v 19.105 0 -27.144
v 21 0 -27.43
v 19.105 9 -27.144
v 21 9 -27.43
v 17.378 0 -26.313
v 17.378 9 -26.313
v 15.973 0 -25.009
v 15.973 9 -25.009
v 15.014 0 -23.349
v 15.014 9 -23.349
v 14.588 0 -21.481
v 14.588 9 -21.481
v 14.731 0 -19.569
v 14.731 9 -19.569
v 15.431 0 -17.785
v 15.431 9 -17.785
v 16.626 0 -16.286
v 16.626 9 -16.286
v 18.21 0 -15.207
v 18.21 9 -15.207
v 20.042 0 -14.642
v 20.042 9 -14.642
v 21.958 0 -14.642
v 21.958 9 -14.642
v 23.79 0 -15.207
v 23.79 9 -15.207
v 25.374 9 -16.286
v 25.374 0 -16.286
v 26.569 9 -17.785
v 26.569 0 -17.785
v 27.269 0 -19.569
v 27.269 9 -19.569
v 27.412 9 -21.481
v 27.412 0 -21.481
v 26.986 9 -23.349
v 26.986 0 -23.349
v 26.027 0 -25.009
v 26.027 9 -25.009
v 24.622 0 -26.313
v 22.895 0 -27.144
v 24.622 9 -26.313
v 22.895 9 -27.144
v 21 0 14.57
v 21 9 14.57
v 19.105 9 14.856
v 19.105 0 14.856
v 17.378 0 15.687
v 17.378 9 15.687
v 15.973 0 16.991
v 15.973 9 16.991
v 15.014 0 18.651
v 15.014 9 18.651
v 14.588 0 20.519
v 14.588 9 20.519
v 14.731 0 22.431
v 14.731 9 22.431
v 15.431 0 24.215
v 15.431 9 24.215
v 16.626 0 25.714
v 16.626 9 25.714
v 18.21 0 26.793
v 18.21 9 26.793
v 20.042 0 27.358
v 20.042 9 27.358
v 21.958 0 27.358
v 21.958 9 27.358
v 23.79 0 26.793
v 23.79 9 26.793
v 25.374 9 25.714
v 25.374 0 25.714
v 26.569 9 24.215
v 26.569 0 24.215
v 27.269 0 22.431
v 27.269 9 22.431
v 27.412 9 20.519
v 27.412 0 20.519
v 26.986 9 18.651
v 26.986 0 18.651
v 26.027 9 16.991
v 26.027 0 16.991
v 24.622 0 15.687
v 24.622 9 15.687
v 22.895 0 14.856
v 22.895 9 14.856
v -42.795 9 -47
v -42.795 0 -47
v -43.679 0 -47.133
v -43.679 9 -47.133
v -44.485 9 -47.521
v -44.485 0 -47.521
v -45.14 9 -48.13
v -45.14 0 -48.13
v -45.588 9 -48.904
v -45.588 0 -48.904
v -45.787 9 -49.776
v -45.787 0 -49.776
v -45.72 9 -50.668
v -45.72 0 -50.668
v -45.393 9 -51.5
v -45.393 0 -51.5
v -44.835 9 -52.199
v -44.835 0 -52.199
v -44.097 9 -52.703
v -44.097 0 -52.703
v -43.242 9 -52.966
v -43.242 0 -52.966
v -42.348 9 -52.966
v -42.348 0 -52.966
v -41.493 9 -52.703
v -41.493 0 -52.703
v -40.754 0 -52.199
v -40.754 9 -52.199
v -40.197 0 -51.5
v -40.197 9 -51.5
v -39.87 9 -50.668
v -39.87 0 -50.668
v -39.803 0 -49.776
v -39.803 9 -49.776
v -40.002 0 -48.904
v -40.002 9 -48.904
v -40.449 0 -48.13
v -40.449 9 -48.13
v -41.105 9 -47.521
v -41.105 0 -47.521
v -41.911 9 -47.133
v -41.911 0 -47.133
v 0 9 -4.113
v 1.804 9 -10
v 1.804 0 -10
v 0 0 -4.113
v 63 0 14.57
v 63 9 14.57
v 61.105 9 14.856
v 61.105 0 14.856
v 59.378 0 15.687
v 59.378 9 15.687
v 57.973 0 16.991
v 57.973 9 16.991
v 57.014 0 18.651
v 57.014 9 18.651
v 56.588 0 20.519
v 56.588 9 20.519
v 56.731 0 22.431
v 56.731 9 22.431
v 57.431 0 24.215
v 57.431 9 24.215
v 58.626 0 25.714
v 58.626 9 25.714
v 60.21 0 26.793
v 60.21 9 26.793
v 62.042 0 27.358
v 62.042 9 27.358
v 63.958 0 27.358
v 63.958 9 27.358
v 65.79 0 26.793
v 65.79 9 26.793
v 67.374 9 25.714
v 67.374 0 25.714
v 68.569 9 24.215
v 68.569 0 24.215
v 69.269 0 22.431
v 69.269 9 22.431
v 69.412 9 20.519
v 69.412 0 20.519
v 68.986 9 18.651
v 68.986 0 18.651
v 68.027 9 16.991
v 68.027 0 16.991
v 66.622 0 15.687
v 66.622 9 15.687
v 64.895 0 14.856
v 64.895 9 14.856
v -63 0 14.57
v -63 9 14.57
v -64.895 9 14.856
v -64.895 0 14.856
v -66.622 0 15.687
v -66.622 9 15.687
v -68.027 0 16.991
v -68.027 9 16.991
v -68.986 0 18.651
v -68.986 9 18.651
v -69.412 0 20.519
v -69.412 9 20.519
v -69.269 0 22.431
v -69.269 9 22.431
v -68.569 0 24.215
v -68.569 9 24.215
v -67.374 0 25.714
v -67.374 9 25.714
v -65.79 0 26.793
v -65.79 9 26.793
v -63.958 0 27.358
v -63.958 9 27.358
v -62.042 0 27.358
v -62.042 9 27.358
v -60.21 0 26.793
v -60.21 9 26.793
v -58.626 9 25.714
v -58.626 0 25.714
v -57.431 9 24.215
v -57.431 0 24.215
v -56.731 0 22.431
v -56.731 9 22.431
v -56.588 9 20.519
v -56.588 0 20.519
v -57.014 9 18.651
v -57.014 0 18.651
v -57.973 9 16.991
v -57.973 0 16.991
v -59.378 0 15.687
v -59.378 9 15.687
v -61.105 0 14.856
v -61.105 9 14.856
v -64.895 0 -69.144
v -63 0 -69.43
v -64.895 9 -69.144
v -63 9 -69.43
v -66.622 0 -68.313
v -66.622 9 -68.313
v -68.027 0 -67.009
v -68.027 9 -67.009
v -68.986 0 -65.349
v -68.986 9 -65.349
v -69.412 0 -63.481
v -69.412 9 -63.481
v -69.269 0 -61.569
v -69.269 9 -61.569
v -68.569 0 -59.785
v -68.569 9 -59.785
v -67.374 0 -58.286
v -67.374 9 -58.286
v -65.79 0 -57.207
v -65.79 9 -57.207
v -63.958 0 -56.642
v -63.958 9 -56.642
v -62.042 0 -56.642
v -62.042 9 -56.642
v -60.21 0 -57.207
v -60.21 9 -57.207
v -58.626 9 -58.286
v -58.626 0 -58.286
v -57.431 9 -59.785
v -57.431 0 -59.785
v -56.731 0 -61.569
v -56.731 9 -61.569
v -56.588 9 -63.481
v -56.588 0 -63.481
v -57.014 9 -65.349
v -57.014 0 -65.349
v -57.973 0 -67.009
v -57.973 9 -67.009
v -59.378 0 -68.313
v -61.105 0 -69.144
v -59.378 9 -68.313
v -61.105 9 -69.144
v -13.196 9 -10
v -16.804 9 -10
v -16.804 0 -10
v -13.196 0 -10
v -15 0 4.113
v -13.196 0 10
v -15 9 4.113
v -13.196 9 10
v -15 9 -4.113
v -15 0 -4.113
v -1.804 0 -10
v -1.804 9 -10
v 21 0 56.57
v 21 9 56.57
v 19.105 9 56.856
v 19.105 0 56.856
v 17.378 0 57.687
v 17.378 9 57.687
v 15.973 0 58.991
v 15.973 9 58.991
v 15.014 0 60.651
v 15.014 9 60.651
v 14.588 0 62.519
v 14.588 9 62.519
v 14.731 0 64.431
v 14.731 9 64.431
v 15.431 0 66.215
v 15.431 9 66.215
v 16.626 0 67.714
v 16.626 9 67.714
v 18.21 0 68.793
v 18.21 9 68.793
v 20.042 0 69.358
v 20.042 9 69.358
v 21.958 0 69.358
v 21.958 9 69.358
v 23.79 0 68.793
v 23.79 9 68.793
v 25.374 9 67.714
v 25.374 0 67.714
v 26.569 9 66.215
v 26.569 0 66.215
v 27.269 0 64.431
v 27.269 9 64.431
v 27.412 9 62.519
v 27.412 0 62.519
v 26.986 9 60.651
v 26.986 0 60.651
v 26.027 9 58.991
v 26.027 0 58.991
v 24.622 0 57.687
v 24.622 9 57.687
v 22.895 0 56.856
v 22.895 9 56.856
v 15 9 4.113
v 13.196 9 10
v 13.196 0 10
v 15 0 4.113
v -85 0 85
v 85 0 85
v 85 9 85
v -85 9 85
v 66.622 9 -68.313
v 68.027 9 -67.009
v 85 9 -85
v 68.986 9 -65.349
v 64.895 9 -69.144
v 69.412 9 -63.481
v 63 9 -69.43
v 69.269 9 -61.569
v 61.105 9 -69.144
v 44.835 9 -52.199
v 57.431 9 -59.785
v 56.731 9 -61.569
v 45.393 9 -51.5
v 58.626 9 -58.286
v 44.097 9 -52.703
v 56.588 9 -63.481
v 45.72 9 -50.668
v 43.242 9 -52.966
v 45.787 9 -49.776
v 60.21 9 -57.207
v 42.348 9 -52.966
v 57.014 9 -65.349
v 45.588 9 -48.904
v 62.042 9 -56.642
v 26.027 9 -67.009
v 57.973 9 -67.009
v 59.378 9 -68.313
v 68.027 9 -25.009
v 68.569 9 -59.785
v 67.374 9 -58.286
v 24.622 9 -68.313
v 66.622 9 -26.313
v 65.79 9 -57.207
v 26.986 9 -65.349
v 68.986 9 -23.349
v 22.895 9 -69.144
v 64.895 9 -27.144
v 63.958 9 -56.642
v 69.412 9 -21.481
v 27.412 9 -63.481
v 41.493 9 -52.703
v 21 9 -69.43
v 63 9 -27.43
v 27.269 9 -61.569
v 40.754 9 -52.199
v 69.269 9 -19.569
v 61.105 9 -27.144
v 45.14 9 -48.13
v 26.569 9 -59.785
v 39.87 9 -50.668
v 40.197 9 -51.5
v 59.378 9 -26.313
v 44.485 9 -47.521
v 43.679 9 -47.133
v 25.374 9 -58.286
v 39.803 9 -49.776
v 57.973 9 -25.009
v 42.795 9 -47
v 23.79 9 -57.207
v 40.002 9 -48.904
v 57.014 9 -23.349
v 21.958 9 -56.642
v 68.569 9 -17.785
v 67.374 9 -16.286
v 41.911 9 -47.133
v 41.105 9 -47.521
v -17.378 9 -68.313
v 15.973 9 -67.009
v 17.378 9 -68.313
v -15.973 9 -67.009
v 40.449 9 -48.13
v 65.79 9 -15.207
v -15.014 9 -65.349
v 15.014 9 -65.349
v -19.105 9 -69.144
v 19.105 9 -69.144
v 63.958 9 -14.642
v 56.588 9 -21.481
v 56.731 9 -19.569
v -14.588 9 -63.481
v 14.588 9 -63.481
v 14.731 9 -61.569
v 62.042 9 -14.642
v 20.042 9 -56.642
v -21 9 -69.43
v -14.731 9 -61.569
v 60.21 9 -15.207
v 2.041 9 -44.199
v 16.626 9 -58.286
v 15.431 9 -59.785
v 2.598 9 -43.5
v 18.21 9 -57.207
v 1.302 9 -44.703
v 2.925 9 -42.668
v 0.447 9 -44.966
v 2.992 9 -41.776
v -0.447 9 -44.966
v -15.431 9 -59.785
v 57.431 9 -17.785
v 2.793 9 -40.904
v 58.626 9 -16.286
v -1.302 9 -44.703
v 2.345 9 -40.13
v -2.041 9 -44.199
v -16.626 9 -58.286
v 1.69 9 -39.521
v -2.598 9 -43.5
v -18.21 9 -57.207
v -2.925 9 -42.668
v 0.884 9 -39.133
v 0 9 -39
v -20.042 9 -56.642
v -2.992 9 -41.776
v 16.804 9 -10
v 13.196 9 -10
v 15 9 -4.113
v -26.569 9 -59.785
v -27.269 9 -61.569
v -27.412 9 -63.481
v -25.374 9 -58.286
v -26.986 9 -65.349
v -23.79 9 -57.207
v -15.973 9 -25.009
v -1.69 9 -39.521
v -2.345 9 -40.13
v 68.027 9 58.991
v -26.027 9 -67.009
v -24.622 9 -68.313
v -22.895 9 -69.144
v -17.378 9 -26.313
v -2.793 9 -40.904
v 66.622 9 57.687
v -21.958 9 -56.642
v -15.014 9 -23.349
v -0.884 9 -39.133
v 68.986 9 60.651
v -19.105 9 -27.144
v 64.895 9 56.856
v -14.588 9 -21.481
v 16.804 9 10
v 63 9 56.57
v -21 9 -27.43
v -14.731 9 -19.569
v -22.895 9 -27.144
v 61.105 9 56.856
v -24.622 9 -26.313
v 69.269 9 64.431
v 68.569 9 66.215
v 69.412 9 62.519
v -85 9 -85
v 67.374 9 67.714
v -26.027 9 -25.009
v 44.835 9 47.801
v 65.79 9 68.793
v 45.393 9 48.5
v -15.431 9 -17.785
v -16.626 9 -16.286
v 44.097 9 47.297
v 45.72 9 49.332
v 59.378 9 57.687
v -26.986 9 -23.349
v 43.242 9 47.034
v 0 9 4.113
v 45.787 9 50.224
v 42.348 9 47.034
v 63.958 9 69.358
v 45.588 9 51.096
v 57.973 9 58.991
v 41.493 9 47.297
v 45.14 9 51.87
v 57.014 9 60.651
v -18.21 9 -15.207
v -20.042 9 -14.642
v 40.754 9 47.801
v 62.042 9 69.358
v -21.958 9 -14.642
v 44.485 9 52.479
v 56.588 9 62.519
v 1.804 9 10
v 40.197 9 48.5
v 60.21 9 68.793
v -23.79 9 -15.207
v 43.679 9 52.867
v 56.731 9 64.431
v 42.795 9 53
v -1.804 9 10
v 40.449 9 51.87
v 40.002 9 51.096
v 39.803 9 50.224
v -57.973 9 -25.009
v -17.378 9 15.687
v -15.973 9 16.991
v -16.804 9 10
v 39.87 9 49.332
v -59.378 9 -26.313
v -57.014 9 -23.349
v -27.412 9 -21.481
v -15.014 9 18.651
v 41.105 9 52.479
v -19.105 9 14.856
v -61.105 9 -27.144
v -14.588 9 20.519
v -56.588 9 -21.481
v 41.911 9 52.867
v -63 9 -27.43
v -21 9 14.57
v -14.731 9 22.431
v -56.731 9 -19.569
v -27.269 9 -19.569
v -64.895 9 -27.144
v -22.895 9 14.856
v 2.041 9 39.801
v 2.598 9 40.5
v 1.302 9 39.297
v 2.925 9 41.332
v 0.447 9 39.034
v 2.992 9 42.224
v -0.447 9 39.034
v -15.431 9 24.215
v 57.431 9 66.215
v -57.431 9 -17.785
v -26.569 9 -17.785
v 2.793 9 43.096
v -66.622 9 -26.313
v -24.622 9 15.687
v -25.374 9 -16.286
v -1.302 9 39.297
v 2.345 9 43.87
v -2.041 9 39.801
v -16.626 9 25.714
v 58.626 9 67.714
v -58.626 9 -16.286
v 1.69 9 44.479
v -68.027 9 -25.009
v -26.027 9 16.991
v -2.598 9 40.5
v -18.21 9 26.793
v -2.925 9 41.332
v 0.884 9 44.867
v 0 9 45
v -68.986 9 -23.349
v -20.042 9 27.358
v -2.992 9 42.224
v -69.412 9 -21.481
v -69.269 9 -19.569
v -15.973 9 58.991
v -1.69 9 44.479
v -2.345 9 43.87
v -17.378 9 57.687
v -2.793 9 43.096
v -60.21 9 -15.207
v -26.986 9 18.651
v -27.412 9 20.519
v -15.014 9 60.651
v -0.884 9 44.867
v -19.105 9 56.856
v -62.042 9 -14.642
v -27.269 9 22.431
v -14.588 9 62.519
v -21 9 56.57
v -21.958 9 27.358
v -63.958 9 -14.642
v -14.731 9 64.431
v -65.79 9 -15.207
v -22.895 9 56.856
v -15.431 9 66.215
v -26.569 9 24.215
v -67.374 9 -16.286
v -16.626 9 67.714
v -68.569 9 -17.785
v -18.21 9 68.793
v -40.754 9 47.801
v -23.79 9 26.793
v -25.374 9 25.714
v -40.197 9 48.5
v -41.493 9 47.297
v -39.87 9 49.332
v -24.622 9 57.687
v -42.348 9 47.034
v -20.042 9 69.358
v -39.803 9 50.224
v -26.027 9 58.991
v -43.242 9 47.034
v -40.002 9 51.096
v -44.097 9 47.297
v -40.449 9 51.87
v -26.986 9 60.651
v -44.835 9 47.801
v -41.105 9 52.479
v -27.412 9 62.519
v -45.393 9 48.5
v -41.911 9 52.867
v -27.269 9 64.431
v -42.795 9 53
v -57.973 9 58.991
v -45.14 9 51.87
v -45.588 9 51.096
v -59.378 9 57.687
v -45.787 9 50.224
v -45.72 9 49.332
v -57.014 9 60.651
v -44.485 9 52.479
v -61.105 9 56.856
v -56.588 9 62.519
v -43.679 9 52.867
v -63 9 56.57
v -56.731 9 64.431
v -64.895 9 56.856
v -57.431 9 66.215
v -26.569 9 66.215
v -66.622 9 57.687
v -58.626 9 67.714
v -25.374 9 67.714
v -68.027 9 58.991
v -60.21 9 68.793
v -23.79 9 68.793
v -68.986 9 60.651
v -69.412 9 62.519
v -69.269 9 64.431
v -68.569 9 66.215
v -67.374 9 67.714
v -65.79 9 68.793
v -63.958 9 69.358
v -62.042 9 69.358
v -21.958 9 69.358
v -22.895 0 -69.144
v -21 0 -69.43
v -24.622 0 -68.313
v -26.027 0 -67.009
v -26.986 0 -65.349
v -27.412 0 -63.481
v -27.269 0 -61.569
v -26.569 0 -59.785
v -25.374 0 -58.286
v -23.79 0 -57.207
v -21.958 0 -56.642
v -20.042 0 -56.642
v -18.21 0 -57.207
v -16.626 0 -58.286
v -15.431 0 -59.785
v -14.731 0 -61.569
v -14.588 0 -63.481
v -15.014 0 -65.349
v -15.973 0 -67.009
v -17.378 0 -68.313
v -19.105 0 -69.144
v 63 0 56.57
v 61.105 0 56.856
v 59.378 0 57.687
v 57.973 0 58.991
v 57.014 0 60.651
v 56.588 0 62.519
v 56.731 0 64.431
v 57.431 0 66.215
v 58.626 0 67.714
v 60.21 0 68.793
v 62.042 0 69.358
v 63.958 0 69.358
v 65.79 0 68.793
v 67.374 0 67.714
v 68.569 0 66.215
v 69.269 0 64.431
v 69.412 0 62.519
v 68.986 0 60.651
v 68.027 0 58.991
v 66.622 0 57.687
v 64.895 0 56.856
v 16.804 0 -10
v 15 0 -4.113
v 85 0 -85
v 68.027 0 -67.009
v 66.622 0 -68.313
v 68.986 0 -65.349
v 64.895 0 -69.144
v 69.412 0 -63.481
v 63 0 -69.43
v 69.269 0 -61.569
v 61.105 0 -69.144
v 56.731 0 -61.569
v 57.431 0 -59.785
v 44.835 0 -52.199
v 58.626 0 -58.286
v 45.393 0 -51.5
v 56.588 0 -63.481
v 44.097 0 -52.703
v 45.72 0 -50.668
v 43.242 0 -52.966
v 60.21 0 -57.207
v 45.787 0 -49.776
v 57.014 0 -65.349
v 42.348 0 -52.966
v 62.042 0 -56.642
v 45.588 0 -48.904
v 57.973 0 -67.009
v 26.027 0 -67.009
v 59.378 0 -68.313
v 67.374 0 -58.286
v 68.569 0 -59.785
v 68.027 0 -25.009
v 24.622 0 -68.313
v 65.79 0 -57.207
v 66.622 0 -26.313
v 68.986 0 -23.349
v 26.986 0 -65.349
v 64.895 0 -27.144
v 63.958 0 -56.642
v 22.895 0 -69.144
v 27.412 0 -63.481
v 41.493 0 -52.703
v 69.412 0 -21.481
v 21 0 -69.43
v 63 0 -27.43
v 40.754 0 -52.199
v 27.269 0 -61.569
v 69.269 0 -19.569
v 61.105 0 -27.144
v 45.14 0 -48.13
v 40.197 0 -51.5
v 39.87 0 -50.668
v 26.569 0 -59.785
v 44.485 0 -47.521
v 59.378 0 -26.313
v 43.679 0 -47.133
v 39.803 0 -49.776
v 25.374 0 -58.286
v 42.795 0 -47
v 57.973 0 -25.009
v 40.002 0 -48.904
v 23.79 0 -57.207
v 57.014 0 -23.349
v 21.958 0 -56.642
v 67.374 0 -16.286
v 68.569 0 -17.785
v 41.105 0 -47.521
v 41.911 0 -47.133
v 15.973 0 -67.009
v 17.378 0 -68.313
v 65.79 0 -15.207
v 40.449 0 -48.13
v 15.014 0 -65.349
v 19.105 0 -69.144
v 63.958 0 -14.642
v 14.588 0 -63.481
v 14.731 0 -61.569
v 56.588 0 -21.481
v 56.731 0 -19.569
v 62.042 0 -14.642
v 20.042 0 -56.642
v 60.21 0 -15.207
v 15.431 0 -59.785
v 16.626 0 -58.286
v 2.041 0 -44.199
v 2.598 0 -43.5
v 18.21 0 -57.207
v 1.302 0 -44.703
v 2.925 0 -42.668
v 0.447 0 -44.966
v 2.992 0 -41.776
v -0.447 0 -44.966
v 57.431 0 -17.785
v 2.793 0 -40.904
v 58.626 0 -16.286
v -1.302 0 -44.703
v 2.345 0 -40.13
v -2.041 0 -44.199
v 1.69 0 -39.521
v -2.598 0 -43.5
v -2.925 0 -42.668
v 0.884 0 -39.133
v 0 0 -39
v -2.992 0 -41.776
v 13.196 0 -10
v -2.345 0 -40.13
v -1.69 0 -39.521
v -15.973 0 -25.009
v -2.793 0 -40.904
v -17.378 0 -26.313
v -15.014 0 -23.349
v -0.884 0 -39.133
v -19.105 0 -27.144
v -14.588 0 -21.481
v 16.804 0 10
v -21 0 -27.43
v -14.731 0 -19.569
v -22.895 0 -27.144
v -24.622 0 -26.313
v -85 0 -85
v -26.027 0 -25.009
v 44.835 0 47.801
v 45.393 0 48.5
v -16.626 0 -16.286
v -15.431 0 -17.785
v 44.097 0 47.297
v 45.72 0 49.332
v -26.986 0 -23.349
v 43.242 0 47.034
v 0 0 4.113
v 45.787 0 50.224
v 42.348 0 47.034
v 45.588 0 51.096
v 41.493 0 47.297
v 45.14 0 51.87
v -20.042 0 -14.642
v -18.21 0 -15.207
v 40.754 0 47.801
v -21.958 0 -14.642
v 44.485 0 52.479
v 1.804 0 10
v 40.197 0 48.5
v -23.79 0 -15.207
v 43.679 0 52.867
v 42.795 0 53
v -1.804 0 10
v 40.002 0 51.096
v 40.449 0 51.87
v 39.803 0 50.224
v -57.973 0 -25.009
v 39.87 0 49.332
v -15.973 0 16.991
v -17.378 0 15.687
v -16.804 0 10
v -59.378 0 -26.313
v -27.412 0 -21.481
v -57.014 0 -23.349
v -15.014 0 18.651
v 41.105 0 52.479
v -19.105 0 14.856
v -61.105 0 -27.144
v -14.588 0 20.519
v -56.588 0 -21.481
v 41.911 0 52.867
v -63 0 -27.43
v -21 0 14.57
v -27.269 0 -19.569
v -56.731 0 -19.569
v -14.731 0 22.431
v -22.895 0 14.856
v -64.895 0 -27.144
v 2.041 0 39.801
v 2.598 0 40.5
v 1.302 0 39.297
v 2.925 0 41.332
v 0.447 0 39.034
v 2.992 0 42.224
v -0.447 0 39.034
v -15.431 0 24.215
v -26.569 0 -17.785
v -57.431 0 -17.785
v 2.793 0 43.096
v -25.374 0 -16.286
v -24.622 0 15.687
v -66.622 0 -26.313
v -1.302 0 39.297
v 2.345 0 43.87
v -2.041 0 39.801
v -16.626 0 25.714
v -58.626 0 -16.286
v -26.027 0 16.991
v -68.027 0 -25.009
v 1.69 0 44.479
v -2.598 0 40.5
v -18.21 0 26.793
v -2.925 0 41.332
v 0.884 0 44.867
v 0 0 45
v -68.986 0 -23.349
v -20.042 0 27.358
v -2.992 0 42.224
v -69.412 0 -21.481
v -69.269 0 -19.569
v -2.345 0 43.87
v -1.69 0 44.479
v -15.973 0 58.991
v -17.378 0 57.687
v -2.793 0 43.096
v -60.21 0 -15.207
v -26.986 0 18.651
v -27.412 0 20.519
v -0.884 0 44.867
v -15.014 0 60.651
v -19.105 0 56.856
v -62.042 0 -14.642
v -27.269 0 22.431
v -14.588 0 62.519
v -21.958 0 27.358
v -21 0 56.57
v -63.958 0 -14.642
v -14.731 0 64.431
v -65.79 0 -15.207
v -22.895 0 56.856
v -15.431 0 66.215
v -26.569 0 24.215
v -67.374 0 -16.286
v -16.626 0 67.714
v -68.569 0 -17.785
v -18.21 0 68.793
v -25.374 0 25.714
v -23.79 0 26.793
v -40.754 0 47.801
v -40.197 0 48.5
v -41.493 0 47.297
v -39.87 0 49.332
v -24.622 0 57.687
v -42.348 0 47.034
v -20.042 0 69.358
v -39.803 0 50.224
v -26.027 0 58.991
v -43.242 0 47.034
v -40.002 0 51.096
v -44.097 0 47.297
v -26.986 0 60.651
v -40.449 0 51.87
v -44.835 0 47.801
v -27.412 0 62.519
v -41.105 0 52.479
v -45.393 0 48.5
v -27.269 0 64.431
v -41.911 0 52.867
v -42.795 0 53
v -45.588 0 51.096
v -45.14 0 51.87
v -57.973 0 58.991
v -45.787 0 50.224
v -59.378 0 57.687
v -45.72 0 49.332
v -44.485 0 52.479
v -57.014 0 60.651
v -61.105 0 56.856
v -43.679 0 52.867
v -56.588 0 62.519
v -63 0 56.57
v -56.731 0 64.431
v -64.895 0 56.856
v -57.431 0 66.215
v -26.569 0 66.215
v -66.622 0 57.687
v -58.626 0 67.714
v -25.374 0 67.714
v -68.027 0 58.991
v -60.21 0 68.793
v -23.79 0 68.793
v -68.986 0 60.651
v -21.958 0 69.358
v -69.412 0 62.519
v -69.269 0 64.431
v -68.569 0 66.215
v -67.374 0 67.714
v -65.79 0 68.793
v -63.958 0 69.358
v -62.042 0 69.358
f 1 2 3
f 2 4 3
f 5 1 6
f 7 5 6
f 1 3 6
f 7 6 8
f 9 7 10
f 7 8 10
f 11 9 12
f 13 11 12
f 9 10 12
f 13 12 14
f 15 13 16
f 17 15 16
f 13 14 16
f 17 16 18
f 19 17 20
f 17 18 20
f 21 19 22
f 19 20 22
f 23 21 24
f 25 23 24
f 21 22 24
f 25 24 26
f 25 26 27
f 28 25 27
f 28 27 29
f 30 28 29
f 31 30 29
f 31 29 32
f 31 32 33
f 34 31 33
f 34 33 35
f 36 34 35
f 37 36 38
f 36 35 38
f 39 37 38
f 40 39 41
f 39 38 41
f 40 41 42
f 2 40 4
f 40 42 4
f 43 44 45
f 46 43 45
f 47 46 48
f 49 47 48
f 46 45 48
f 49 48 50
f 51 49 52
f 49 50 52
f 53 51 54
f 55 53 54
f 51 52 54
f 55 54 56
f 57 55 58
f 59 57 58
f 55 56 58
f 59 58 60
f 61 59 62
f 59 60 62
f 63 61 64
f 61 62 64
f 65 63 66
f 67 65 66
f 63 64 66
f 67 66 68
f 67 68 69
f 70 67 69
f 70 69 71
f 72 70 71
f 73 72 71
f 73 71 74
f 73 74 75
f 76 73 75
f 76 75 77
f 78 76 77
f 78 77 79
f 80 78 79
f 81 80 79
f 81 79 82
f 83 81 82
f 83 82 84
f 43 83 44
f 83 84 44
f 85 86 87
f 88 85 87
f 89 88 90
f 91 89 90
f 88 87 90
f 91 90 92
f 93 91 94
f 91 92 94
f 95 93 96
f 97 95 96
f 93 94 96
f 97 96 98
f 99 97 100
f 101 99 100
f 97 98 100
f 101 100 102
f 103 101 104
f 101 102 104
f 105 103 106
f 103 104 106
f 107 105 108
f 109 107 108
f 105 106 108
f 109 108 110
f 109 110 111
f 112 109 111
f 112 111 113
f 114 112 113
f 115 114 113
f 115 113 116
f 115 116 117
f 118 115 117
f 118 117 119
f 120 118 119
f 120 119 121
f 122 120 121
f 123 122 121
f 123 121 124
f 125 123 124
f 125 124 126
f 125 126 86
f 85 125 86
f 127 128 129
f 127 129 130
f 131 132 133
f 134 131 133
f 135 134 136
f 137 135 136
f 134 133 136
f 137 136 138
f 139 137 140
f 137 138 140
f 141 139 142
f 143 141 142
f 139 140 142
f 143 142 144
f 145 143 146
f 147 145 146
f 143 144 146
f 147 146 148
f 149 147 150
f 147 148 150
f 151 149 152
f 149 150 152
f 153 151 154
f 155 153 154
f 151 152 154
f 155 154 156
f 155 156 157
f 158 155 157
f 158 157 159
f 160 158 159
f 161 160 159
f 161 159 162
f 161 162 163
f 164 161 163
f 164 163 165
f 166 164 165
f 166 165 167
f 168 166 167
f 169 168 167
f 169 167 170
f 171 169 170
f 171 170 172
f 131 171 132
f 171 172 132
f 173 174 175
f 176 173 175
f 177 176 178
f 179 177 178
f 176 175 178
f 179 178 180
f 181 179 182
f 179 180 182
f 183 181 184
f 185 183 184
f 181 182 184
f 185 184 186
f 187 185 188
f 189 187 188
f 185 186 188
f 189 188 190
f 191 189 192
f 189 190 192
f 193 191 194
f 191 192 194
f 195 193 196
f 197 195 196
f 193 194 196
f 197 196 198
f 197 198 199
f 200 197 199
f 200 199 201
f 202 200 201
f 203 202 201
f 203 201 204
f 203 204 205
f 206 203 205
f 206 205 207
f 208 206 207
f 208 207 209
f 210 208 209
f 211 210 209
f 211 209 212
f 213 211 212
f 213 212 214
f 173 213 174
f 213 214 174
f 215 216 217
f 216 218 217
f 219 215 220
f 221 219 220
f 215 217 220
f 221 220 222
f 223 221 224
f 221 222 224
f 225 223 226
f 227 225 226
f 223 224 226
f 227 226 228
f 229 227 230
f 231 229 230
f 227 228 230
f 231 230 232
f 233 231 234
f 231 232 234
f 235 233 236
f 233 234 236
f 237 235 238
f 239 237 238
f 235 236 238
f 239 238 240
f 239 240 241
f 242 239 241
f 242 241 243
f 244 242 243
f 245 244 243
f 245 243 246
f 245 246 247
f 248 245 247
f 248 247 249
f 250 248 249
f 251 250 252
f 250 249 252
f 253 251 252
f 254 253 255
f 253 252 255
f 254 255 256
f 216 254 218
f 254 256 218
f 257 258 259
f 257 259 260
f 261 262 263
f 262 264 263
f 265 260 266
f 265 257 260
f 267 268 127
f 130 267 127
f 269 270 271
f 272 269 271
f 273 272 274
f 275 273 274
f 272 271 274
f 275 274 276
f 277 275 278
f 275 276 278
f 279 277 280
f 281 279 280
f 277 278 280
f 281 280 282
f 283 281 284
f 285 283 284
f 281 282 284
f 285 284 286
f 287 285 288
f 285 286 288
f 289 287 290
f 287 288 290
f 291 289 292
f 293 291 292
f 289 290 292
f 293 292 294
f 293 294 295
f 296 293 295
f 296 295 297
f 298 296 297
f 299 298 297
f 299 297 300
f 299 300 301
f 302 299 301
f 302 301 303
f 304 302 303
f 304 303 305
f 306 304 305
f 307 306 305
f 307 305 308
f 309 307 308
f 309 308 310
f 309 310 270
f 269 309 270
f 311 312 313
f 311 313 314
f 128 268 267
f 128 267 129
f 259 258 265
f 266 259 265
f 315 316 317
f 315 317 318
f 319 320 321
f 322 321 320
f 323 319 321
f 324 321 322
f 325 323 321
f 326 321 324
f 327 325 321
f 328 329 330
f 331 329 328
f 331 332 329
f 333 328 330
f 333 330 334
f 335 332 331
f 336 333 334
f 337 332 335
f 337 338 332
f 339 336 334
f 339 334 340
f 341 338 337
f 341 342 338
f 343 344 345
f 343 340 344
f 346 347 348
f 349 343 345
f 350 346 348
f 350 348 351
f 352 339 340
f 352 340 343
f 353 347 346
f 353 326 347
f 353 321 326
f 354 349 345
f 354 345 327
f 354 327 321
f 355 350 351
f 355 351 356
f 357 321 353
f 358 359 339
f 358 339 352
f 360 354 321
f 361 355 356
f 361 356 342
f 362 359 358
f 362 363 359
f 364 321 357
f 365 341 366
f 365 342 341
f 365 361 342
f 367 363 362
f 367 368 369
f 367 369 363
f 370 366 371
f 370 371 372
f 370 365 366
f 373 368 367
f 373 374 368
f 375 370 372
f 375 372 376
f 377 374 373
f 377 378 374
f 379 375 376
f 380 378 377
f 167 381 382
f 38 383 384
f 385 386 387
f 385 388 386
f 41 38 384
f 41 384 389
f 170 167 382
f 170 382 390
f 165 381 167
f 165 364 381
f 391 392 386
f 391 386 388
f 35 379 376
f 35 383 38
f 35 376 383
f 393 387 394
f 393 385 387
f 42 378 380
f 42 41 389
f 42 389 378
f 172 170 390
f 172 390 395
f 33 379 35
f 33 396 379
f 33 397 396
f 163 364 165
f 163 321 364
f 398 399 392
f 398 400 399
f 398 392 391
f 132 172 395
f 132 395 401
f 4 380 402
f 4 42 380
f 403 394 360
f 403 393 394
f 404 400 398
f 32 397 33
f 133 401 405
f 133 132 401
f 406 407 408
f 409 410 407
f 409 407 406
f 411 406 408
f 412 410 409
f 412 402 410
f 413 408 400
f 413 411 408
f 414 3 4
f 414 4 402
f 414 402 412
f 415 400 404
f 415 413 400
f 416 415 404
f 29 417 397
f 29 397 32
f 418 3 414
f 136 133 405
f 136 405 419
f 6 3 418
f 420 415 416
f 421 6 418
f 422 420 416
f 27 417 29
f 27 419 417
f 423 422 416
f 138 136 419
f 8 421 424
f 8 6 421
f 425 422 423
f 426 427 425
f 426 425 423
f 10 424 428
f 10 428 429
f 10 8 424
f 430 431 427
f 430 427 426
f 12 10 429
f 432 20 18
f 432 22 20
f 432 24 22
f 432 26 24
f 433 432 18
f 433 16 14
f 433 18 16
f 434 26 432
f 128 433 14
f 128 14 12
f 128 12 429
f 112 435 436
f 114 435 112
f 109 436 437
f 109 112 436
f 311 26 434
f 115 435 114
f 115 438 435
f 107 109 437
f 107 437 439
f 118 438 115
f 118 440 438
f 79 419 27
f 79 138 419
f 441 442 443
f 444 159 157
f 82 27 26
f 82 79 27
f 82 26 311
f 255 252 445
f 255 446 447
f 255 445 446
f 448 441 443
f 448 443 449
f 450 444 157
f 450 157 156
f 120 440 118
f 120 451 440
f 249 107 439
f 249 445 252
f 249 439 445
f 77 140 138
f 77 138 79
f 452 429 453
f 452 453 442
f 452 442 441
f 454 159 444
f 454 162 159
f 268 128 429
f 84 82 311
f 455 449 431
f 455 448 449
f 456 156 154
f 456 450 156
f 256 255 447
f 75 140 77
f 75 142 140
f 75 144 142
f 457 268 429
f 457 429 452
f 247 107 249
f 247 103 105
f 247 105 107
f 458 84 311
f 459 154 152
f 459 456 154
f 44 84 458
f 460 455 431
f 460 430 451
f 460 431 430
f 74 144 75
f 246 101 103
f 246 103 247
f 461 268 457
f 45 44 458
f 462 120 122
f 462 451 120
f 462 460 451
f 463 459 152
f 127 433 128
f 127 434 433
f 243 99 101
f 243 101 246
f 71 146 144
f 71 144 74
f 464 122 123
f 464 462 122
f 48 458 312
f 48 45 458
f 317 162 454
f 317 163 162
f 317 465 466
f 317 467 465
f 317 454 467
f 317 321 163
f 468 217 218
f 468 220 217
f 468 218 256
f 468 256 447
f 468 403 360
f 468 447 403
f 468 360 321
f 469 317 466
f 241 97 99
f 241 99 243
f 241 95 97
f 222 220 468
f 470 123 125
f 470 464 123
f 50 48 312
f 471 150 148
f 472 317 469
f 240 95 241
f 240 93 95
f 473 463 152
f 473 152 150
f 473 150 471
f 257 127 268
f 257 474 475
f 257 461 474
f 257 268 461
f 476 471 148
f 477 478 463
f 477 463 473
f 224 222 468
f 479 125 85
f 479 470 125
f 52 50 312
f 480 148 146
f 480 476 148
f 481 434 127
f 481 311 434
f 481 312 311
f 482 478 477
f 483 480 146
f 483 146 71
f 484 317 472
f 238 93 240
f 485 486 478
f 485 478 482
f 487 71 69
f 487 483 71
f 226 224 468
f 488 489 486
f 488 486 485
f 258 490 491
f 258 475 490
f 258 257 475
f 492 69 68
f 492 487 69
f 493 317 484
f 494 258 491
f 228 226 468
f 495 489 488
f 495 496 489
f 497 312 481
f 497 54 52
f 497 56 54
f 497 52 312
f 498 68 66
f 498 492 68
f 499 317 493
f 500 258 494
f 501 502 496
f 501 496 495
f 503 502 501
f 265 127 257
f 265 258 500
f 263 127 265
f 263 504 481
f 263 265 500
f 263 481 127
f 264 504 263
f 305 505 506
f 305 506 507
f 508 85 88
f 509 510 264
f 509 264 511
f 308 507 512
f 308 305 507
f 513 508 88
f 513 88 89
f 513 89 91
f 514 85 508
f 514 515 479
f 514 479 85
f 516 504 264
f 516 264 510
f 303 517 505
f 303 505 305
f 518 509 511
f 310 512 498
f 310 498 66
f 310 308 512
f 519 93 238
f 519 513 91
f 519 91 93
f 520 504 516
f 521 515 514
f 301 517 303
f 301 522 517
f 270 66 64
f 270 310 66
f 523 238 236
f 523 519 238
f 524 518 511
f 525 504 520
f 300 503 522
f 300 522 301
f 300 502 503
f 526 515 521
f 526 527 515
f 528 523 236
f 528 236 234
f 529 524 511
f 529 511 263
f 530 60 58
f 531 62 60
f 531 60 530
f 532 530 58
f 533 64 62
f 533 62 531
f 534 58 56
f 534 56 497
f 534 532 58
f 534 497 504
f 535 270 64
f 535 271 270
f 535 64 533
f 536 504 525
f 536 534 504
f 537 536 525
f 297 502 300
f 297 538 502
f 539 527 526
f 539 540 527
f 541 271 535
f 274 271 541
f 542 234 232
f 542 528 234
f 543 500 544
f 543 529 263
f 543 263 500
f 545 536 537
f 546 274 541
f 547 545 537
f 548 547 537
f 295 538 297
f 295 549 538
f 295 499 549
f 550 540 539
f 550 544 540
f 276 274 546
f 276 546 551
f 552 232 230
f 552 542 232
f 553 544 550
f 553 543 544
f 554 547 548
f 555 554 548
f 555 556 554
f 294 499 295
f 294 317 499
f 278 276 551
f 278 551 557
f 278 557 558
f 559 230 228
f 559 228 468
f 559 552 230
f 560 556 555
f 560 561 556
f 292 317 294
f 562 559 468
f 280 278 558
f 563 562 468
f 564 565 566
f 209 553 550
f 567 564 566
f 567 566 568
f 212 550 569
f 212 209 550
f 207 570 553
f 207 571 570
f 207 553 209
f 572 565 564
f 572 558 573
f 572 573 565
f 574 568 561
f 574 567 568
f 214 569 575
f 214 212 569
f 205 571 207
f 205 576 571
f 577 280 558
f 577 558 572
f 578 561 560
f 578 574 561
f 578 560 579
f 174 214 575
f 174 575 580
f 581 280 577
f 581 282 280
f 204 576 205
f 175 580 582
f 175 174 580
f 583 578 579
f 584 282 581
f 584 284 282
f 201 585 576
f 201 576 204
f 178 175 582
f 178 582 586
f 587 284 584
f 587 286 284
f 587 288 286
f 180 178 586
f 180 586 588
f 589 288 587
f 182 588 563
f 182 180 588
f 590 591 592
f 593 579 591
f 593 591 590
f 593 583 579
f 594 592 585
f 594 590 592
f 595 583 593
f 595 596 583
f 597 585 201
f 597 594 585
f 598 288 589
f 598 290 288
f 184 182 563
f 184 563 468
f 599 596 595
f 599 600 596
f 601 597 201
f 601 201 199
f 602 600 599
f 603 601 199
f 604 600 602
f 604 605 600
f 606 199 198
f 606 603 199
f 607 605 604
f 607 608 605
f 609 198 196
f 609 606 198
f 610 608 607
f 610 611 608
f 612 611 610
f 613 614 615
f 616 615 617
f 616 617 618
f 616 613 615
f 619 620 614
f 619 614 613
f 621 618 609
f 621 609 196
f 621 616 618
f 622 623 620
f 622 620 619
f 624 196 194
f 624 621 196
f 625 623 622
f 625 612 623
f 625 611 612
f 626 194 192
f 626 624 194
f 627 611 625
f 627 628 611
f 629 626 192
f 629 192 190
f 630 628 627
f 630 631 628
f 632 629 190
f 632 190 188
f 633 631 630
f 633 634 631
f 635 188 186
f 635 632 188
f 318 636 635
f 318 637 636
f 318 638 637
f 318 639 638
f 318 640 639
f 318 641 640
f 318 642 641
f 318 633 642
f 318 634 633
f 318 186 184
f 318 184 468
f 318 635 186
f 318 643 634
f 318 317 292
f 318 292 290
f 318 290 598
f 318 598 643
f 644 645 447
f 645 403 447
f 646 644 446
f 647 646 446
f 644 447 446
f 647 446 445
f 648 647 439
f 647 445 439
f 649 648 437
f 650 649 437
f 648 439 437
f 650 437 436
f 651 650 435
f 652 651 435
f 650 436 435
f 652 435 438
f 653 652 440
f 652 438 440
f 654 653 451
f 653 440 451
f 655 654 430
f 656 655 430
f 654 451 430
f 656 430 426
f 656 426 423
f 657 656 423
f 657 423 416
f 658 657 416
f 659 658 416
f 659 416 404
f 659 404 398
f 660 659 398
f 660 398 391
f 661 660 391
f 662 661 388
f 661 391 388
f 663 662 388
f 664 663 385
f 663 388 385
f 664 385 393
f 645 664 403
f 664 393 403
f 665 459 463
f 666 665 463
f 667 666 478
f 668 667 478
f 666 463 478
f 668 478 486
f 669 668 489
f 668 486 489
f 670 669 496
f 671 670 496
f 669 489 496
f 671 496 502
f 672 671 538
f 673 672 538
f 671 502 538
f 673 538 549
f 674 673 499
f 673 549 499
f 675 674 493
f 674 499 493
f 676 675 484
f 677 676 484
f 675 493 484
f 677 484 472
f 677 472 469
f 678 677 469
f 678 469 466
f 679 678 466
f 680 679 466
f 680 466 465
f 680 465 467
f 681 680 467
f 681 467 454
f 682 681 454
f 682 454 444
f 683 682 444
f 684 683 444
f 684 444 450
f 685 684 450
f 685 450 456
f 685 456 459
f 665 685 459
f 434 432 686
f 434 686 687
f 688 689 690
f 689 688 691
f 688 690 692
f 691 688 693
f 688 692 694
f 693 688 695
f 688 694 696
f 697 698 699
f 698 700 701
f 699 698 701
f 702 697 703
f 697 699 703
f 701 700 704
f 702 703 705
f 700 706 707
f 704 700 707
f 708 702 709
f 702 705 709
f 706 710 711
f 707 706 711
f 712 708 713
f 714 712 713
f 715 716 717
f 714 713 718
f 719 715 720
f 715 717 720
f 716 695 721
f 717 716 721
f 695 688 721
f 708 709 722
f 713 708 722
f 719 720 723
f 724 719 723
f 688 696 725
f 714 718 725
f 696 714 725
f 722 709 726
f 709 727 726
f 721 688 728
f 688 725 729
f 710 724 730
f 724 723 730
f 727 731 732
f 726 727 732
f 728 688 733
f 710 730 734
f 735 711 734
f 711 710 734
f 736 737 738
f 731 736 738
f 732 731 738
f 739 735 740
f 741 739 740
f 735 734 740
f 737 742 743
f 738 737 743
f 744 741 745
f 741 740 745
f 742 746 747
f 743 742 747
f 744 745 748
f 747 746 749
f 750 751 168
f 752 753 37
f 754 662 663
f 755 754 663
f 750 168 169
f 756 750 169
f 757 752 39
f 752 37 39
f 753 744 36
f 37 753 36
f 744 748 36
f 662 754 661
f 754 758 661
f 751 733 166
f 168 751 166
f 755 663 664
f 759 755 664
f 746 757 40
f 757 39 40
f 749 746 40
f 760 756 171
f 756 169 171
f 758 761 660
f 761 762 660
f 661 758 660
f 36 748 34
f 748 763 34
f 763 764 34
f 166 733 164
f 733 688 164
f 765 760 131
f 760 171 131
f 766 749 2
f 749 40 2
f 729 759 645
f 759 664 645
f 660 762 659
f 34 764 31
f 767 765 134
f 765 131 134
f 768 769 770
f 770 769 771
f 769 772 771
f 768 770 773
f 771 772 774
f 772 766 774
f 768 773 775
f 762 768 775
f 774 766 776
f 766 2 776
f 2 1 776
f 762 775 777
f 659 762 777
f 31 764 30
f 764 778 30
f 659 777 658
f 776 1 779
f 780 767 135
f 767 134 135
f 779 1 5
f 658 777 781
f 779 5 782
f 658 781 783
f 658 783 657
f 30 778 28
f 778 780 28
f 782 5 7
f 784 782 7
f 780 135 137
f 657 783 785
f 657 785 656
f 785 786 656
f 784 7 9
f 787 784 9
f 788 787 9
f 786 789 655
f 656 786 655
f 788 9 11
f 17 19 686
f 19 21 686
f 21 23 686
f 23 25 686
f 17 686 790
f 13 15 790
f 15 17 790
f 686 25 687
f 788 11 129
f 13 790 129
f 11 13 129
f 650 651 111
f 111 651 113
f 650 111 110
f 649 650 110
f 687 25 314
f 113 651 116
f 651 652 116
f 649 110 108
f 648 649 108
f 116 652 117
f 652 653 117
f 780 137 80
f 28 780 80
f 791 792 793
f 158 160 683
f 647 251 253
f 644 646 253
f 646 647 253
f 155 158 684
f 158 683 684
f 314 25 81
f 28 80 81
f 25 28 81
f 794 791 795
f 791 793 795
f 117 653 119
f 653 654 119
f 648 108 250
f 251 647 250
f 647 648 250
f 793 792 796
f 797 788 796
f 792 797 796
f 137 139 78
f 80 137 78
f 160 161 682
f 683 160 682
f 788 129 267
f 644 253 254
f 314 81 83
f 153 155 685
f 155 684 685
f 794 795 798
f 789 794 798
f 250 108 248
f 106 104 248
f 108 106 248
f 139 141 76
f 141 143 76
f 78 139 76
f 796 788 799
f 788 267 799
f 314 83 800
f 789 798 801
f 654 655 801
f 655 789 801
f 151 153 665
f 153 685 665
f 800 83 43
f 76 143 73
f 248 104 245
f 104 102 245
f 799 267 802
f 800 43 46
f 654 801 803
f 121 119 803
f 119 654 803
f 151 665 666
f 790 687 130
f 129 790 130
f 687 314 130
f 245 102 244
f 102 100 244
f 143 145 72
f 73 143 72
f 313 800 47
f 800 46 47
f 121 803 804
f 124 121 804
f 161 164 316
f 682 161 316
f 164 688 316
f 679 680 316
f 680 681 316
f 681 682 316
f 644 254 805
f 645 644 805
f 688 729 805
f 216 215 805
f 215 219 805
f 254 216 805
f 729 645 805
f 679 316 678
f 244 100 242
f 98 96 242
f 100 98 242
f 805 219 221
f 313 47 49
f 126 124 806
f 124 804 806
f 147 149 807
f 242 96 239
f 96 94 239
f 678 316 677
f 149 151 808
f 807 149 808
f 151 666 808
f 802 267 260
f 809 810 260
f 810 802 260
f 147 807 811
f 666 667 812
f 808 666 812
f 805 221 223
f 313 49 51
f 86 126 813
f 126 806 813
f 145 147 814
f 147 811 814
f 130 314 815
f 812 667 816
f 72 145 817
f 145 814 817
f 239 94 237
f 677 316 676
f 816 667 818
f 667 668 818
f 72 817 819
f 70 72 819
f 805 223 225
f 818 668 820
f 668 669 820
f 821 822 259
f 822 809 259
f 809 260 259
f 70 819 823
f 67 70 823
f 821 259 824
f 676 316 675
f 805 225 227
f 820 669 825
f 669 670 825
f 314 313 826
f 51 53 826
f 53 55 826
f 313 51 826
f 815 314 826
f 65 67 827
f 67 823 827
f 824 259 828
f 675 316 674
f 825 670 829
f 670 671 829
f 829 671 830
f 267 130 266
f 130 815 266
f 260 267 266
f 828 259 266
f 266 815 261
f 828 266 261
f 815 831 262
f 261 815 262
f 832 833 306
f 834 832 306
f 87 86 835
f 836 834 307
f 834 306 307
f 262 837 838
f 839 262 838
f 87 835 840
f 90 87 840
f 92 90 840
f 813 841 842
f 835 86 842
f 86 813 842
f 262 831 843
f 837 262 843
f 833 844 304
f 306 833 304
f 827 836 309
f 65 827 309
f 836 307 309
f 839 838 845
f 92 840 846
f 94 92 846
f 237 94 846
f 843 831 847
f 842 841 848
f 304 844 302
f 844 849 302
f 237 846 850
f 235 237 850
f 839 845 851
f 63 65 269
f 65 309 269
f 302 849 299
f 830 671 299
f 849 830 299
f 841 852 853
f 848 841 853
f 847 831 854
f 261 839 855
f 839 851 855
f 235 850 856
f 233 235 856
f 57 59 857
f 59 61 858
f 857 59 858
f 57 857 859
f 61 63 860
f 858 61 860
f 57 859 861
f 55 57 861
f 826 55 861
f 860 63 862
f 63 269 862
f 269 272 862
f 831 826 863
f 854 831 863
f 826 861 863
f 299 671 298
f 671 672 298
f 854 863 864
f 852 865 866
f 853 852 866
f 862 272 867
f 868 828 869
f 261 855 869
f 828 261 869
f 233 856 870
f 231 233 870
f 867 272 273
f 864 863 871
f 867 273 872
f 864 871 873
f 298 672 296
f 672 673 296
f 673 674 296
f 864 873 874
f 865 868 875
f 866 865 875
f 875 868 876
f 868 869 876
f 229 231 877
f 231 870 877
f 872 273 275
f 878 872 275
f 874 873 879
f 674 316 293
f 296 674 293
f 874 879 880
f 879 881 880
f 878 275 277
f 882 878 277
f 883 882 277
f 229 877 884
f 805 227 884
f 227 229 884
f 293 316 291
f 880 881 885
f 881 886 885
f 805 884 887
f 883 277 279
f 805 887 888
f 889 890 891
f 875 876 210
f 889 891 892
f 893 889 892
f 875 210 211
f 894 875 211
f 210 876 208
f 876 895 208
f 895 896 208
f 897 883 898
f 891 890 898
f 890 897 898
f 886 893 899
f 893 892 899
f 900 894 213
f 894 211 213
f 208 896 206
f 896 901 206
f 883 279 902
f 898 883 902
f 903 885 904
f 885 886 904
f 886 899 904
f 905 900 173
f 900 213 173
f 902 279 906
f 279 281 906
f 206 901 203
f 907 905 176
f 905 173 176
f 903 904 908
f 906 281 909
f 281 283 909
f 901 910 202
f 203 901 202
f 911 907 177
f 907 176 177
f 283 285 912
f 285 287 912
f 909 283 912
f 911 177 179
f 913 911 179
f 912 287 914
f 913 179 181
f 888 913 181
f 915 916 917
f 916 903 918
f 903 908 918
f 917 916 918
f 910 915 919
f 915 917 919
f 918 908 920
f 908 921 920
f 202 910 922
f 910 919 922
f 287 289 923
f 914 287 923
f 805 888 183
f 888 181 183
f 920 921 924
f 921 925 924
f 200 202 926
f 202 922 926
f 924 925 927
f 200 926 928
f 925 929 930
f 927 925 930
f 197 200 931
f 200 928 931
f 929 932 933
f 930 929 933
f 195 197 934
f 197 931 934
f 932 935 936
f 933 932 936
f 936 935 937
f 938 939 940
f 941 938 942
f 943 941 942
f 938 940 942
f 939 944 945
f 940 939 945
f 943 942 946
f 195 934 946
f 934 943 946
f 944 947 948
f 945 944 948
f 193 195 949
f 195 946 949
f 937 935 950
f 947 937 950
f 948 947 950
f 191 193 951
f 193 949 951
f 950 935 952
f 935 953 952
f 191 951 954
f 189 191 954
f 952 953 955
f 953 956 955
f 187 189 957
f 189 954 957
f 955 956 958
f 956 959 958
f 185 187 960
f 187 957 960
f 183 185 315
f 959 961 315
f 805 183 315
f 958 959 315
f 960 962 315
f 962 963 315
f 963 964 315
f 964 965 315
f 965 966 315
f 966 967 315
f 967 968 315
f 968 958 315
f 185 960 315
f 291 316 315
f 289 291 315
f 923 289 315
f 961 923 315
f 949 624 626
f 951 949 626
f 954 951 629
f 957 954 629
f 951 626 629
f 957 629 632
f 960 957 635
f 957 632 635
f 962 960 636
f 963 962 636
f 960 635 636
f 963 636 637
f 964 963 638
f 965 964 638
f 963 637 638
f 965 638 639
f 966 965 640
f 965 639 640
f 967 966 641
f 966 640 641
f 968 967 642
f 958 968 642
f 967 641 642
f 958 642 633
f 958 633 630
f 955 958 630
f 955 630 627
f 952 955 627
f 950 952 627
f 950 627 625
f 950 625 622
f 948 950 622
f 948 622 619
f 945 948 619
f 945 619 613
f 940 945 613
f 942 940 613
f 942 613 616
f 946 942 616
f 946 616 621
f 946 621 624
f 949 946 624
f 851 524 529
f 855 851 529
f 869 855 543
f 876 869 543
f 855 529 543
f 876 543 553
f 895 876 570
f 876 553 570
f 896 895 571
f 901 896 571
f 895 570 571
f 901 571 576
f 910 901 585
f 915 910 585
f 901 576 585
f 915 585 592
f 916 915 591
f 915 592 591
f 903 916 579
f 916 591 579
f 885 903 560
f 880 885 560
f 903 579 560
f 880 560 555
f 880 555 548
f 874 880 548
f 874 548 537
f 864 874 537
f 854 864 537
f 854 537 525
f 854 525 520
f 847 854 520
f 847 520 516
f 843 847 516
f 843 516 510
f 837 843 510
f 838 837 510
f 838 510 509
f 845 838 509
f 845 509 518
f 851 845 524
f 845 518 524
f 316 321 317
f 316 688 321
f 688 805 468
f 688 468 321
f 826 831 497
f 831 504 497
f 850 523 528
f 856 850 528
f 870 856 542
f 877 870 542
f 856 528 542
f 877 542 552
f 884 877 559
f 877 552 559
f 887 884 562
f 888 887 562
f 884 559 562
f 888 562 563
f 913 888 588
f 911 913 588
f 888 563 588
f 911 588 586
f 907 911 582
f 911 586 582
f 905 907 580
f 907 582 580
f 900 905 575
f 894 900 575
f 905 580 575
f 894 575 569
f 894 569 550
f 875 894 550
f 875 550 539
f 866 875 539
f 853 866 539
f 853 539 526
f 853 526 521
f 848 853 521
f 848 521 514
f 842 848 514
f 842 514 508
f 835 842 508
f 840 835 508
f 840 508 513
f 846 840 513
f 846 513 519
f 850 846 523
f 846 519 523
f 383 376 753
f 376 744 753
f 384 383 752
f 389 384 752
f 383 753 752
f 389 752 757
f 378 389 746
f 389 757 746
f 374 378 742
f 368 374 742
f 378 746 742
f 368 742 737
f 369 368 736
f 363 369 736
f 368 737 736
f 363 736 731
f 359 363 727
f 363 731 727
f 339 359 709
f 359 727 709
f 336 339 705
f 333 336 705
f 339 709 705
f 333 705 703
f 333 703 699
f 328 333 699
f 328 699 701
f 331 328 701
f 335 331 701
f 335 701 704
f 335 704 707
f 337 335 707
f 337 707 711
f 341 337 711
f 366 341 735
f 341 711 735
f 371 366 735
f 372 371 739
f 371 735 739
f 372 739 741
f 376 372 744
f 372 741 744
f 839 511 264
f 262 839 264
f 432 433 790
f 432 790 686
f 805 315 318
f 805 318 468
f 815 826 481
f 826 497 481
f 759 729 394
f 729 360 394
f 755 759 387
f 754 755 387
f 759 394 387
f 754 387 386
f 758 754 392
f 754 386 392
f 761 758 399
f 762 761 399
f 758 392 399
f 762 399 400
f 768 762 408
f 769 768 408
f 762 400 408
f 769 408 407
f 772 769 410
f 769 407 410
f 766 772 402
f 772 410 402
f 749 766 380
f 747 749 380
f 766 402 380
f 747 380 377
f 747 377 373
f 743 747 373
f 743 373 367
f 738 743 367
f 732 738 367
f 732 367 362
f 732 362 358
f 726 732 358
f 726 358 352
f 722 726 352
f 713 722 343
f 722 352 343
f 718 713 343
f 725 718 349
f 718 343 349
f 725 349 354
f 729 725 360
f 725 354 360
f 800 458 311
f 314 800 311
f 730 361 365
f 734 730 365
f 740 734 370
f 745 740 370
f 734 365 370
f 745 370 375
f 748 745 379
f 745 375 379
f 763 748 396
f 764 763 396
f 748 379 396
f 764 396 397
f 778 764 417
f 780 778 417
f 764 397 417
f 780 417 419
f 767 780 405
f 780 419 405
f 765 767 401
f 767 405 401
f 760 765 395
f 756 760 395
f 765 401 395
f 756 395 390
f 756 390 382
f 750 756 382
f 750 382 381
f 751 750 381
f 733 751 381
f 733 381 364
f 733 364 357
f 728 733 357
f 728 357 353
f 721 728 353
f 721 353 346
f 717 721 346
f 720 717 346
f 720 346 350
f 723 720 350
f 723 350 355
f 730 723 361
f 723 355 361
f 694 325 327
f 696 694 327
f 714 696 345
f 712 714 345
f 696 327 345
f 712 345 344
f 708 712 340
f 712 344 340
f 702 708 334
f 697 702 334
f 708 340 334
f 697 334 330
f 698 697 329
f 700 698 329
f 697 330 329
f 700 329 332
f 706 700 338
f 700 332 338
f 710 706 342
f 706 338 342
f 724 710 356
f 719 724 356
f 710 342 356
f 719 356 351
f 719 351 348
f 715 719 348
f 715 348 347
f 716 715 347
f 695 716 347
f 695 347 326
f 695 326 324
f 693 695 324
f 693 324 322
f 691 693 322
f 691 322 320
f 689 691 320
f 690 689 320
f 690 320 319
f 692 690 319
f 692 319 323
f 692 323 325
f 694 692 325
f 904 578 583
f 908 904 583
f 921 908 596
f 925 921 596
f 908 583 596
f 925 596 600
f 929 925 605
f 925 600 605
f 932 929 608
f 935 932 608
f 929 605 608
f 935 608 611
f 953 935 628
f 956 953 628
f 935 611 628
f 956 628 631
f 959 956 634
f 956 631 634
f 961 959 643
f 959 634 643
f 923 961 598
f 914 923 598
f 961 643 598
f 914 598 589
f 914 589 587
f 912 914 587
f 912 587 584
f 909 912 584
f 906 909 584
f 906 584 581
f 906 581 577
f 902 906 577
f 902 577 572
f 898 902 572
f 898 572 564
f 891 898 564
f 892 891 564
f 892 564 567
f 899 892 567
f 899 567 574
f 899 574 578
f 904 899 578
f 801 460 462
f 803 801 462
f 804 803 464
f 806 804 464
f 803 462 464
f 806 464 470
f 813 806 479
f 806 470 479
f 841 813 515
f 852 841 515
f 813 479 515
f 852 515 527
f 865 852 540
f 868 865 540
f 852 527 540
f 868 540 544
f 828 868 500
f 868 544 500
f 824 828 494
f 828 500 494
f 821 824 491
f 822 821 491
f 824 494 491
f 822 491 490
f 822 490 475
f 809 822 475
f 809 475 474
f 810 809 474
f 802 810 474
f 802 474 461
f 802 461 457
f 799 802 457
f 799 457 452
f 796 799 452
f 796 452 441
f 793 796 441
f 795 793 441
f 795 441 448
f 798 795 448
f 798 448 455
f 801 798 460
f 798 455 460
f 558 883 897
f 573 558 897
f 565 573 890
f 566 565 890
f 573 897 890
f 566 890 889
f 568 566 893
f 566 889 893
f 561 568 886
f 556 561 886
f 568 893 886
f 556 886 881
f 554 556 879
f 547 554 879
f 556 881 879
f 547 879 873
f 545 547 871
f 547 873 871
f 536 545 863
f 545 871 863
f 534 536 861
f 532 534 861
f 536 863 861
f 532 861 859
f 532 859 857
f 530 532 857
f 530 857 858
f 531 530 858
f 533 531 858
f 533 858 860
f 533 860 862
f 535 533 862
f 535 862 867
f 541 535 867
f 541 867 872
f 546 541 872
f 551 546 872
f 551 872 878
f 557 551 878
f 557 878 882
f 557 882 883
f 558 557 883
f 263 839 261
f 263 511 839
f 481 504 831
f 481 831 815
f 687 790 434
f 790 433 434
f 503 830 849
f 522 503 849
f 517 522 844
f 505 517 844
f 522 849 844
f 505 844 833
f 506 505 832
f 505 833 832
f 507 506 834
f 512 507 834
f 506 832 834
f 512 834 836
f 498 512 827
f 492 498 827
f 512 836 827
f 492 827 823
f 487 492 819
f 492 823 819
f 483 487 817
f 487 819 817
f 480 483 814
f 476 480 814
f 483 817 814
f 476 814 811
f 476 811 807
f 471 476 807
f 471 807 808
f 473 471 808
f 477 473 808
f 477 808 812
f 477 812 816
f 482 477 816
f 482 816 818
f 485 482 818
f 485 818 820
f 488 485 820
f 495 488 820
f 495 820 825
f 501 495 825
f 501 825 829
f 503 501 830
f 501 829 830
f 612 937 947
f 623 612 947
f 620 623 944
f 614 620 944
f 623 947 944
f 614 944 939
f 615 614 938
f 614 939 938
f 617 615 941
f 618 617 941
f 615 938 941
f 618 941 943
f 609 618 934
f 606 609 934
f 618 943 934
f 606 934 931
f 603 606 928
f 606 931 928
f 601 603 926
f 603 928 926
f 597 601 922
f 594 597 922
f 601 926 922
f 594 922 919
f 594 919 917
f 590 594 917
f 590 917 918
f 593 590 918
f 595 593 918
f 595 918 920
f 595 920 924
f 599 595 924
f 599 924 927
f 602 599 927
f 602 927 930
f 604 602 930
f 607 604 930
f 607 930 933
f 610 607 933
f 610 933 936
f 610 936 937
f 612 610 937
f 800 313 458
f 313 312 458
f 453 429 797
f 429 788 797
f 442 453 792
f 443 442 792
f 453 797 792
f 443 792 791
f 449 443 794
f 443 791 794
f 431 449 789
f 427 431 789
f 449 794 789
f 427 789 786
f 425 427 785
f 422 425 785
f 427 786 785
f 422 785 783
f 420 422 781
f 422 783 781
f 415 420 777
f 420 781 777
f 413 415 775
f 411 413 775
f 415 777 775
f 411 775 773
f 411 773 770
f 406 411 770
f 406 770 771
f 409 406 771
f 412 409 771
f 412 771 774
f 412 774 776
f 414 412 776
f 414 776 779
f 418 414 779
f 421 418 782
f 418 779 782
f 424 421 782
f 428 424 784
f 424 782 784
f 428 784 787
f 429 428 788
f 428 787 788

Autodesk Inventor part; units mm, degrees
ref_plane "YZ Plane" through (0, 0, 0) normal (1, 0, 0) x (0, 1, 0)
ref_plane "XZ Plane" through (0, 0, 0) normal (0, 1, 0) x (-1, 0, 0)
ref_plane "XY Plane" through (0, 0, 0) normal (0, 0, 1) x (1, 0, 0)
sketch "Sketch1" plane through (0, 0, 0) normal (0, 1, 0) x (-1, 0, 0)
  line L0 (-85, 85) -> (85, 85)
  line L1 (85, 85) -> (85, -85)
  line L2 (85, -85) -> (-85, -85)
  line L3 (-85, -85) -> (-85, 85)
  line L4 (-85, 85) -> (85, -85) construction
  line L5 (85, 85) -> (-85, -85) construction
  point P0 (0, 0)
  point P1 (-63, -63)
  point P2 (-63, -21)
  point P3 (-63, 21)
  point P4 (-63, 63)
  point P5 (-21, -63)
  point P6 (-21, -21)
  point P7 (-21, 21)
  point P8 (-21, 63)
  point P9 (21, -63)
  point P10 (21, -21)
  point P11 (21, 21)
  point P12 (21, 63)
  point P13 (63, -63)
  point P14 (63, -21)
  point P15 (63, 21)
  point P16 (63, 63)
  dimension "d0" = 170
  dimension "d1" = 170
  dimension "d4" = 42
  dimension "d7" = 42
extrude "Extrusion1" add sketch "Sketch1" along normal blind 9
hole "Hole1" at (63, 0, -63) at (63, 0, -21) at (63, 0, 21) at (63, 0, 63) at (21, 0, -63) at (21, 0, -21) at (21, 0, 21) at (21, 0, 63) at (-21, 0, -63) at (-21, 0, -21) at (-21, 0, 21) at (-21, 0, 63) at (-63, 0, -63) at (-63, 0, -21) at (-63, 0, 21) at (-63, 0, 63) direction (0, 1, 0) diameter 12.86 end through all both
sketch "Sketch2" plane through (0, 9, 0) normal (0, 1, 0) x (1, 0, 0)
  line L0 (-33.7, -4.15) -> (33.7, -4.15)
  line L1 (33.7, -4.15) -> (33.7, 4.15)
  line L2 (33.7, 4.15) -> (-33.7, 4.15)
  line L3 (-33.7, 4.15) -> (-33.7, -4.15)
  line L4 (-33.7, -4.15) -> (33.7, 4.15) construction
  line L5 (33.7, -4.15) -> (-33.7, 4.15) construction
  point P0 (0, 0)
  dimension "d19" = 67.4
  dimension "d20" = 8.3
sketch "Sketch3" plane through (0, 9, 0) normal (0, 1, 0) x (1, 0, 0)
  line L0 (-42.7949, -50) -> (42.7949, -50) construction
  line L1 (42.7949, -50) -> (42.7949, 50) construction
  line L2 (42.7949, 50) -> (-42.7949, 50) construction
  line L3 (-42.7949, 50) -> (-42.7949, -50) construction
  line L4 (-42.7949, -50) -> (42.7949, 50) construction
  line L5 (42.7949, -50) -> (-42.7949, 50) construction
  point P0 (25, -42.5)
  point P1 (0, 0)
  dimension "d31" = 100
hole "Hole3" at (-42.7949, 9, -50) at (42.7949, 9, -50) at (42.7949, 9, 50) at (-42.7949, 9, 50) direction (0, -1, 0) diameter 6 end through all both
sketch "Sketch4" plane through (0, 9, 0) normal (0, 1, 0) x (1, 0, 0)
  circle A0 centre (42.7949, -50) radius 3 construction
  circle A1 centre (-42.7949, 50) radius 3 construction
  circle A2 centre (42.7949, 50) radius 3 construction
  circle A3 centre (-42.7949, -50) radius 3 construction
  circle A4 centre (-63, -21) radius 6.43 construction
  circle A5 centre (-63, 63) radius 6.43 construction
  circle A6 centre (-21, -21) radius 6.43 construction
  circle A7 centre (-21, 63) radius 6.43 construction
  circle A8 centre (21, -21) radius 6.43 construction
  circle A9 centre (21, 63) radius 6.43 construction
  circle A10 centre (63, -21) radius 6.43 construction
  circle A11 centre (63, 63) radius 6.43 construction
  circle A12 centre (63, 21) radius 6.43 construction
  circle A13 centre (63, -63) radius 6.43 construction
  circle A14 centre (21, 21) radius 6.43 construction
  circle A15 centre (21, -63) radius 6.43 construction
  circle A16 centre (-21, 21) radius 6.43 construction
  circle A17 centre (-21, -63) radius 6.43 construction
  circle A18 centre (-63, 21) radius 6.43 construction
  circle A19 centre (-63, -63) radius 6.43 construction
  line L0 (-85, -85) -> (85, -85) construction
  line L1 (85, -85) -> (85, 85) construction
  line L2 (85, 85) -> (-85, 85) construction
  line L3 (-85, 85) -> (-85, -85) construction
  line L4 (-85, 85) -> (85, 85) construction
  line L5 (-7.5, -85) -> (7.5, -85) construction
  line L6 (7.5, -85) -> (7.5, 85) construction
  line L7 (7.5, 85) -> (-7.5, 85) construction
  line L8 (-7.5, 85) -> (-7.5, -85) construction
  line L9 (-7.5, -85) -> (7.5, 85) construction
  line L10 (7.5, -85) -> (-7.5, 85) construction
  line L11 (-21, 63) -> (21, 63) construction
  line L12 (21, 63) -> (21, 21) construction
  line L13 (21, 21) -> (-21, 21) construction
  line L14 (-21, 21) -> (-21, 63) construction
  line L15 (-85, 0) -> (85, 0) construction
  point P0 (0, 0)
  point P1 (0, 42)
  point P2 (0, -42)
  dimension "d39" = 15
hole "Hole4" at (0, 9, -42) at (0, 9, 42) direction (0, -1, 0) diameter 6 end through all both
sketch "Sketch5" plane through (0, 9, 0) normal (0, 1, 0) x (1, 0, 0)
  line L0 (-33.7, -10) -> (33.7, -10) construction
  line L1 (33.7, -10) -> (33.7, 10) construction
  line L2 (33.7, 10) -> (-33.7, 10) construction
  line L3 (-33.7, 10) -> (-33.7, -10) construction
  line L4 (-33.7, -10) -> (33.7, 10) construction
  line L5 (33.7, -10) -> (-33.7, 10) construction
  line L6 (0, 10) -> (0, -10) construction
  line L7 (-1.8038, 10) -> (0, 4.1128)
  line L8 (1.8038, 10) -> (0, 4.1128)
  line L9 (-1.8038, 10) -> (1.8038, 10)
  line L10 (-33.7, 0) -> (33.7, 0) construction
  line L11 (-1.8038, -10) -> (0, -4.1128)
  line L12 (1.8038, -10) -> (0, -4.1128)
  line L13 (-1.8038, -10) -> (1.8038, -10)
  line L14 (-16.8038, 10) -> (-15, 4.1128)
  line L15 (-13.1962, 10) -> (-15, 4.1128)
  line L16 (-16.8038, 10) -> (-13.1962, 10)
  line L17 (13.1962, 10) -> (15, 4.1128)
  line L18 (16.8038, 10) -> (15, 4.1128)
  line L19 (13.1962, 10) -> (16.8038, 10)
  line L20 (-1.8038, 10) -> (0, 4.1128)
  line L21 (1.8038, 10) -> (0, 4.1128)
  line L22 (-1.8038, 10) -> (1.8038, 10)
  line L23 (-16.8038, -10) -> (-15, -4.1128)
  line L24 (-13.1962, -10) -> (-15, -4.1128)
  line L25 (-16.8038, -10) -> (-13.1962, -10)
  line L26 (13.1962, -10) -> (15, -4.1128)
  line L27 (16.8038, -10) -> (15, -4.1128)
  line L28 (13.1962, -10) -> (16.8038, -10)
  point P0 (0, 0)
  point P1 (-15, 10)
  point P2 (15, 10)
  point P3 (-15, -10)
  point P4 (15, -10)
  dimension "d47" = 67.4
  dimension "d50" = 20
  dimension "d53" = 15
  dimension "d56" = 15
extrude "Extrusion2" cut sketch "Sketch5" against normal blind 10 contours L9 L8 L7 | L11 L12 L13
extrude "Extrusion3" cut sketch "Sketch5" against normal blind 10 contours L16 L15 L14 | L19 L18 L17 | L23 L24 L25 | L26 L27 L28
properties part number "front_plate"
